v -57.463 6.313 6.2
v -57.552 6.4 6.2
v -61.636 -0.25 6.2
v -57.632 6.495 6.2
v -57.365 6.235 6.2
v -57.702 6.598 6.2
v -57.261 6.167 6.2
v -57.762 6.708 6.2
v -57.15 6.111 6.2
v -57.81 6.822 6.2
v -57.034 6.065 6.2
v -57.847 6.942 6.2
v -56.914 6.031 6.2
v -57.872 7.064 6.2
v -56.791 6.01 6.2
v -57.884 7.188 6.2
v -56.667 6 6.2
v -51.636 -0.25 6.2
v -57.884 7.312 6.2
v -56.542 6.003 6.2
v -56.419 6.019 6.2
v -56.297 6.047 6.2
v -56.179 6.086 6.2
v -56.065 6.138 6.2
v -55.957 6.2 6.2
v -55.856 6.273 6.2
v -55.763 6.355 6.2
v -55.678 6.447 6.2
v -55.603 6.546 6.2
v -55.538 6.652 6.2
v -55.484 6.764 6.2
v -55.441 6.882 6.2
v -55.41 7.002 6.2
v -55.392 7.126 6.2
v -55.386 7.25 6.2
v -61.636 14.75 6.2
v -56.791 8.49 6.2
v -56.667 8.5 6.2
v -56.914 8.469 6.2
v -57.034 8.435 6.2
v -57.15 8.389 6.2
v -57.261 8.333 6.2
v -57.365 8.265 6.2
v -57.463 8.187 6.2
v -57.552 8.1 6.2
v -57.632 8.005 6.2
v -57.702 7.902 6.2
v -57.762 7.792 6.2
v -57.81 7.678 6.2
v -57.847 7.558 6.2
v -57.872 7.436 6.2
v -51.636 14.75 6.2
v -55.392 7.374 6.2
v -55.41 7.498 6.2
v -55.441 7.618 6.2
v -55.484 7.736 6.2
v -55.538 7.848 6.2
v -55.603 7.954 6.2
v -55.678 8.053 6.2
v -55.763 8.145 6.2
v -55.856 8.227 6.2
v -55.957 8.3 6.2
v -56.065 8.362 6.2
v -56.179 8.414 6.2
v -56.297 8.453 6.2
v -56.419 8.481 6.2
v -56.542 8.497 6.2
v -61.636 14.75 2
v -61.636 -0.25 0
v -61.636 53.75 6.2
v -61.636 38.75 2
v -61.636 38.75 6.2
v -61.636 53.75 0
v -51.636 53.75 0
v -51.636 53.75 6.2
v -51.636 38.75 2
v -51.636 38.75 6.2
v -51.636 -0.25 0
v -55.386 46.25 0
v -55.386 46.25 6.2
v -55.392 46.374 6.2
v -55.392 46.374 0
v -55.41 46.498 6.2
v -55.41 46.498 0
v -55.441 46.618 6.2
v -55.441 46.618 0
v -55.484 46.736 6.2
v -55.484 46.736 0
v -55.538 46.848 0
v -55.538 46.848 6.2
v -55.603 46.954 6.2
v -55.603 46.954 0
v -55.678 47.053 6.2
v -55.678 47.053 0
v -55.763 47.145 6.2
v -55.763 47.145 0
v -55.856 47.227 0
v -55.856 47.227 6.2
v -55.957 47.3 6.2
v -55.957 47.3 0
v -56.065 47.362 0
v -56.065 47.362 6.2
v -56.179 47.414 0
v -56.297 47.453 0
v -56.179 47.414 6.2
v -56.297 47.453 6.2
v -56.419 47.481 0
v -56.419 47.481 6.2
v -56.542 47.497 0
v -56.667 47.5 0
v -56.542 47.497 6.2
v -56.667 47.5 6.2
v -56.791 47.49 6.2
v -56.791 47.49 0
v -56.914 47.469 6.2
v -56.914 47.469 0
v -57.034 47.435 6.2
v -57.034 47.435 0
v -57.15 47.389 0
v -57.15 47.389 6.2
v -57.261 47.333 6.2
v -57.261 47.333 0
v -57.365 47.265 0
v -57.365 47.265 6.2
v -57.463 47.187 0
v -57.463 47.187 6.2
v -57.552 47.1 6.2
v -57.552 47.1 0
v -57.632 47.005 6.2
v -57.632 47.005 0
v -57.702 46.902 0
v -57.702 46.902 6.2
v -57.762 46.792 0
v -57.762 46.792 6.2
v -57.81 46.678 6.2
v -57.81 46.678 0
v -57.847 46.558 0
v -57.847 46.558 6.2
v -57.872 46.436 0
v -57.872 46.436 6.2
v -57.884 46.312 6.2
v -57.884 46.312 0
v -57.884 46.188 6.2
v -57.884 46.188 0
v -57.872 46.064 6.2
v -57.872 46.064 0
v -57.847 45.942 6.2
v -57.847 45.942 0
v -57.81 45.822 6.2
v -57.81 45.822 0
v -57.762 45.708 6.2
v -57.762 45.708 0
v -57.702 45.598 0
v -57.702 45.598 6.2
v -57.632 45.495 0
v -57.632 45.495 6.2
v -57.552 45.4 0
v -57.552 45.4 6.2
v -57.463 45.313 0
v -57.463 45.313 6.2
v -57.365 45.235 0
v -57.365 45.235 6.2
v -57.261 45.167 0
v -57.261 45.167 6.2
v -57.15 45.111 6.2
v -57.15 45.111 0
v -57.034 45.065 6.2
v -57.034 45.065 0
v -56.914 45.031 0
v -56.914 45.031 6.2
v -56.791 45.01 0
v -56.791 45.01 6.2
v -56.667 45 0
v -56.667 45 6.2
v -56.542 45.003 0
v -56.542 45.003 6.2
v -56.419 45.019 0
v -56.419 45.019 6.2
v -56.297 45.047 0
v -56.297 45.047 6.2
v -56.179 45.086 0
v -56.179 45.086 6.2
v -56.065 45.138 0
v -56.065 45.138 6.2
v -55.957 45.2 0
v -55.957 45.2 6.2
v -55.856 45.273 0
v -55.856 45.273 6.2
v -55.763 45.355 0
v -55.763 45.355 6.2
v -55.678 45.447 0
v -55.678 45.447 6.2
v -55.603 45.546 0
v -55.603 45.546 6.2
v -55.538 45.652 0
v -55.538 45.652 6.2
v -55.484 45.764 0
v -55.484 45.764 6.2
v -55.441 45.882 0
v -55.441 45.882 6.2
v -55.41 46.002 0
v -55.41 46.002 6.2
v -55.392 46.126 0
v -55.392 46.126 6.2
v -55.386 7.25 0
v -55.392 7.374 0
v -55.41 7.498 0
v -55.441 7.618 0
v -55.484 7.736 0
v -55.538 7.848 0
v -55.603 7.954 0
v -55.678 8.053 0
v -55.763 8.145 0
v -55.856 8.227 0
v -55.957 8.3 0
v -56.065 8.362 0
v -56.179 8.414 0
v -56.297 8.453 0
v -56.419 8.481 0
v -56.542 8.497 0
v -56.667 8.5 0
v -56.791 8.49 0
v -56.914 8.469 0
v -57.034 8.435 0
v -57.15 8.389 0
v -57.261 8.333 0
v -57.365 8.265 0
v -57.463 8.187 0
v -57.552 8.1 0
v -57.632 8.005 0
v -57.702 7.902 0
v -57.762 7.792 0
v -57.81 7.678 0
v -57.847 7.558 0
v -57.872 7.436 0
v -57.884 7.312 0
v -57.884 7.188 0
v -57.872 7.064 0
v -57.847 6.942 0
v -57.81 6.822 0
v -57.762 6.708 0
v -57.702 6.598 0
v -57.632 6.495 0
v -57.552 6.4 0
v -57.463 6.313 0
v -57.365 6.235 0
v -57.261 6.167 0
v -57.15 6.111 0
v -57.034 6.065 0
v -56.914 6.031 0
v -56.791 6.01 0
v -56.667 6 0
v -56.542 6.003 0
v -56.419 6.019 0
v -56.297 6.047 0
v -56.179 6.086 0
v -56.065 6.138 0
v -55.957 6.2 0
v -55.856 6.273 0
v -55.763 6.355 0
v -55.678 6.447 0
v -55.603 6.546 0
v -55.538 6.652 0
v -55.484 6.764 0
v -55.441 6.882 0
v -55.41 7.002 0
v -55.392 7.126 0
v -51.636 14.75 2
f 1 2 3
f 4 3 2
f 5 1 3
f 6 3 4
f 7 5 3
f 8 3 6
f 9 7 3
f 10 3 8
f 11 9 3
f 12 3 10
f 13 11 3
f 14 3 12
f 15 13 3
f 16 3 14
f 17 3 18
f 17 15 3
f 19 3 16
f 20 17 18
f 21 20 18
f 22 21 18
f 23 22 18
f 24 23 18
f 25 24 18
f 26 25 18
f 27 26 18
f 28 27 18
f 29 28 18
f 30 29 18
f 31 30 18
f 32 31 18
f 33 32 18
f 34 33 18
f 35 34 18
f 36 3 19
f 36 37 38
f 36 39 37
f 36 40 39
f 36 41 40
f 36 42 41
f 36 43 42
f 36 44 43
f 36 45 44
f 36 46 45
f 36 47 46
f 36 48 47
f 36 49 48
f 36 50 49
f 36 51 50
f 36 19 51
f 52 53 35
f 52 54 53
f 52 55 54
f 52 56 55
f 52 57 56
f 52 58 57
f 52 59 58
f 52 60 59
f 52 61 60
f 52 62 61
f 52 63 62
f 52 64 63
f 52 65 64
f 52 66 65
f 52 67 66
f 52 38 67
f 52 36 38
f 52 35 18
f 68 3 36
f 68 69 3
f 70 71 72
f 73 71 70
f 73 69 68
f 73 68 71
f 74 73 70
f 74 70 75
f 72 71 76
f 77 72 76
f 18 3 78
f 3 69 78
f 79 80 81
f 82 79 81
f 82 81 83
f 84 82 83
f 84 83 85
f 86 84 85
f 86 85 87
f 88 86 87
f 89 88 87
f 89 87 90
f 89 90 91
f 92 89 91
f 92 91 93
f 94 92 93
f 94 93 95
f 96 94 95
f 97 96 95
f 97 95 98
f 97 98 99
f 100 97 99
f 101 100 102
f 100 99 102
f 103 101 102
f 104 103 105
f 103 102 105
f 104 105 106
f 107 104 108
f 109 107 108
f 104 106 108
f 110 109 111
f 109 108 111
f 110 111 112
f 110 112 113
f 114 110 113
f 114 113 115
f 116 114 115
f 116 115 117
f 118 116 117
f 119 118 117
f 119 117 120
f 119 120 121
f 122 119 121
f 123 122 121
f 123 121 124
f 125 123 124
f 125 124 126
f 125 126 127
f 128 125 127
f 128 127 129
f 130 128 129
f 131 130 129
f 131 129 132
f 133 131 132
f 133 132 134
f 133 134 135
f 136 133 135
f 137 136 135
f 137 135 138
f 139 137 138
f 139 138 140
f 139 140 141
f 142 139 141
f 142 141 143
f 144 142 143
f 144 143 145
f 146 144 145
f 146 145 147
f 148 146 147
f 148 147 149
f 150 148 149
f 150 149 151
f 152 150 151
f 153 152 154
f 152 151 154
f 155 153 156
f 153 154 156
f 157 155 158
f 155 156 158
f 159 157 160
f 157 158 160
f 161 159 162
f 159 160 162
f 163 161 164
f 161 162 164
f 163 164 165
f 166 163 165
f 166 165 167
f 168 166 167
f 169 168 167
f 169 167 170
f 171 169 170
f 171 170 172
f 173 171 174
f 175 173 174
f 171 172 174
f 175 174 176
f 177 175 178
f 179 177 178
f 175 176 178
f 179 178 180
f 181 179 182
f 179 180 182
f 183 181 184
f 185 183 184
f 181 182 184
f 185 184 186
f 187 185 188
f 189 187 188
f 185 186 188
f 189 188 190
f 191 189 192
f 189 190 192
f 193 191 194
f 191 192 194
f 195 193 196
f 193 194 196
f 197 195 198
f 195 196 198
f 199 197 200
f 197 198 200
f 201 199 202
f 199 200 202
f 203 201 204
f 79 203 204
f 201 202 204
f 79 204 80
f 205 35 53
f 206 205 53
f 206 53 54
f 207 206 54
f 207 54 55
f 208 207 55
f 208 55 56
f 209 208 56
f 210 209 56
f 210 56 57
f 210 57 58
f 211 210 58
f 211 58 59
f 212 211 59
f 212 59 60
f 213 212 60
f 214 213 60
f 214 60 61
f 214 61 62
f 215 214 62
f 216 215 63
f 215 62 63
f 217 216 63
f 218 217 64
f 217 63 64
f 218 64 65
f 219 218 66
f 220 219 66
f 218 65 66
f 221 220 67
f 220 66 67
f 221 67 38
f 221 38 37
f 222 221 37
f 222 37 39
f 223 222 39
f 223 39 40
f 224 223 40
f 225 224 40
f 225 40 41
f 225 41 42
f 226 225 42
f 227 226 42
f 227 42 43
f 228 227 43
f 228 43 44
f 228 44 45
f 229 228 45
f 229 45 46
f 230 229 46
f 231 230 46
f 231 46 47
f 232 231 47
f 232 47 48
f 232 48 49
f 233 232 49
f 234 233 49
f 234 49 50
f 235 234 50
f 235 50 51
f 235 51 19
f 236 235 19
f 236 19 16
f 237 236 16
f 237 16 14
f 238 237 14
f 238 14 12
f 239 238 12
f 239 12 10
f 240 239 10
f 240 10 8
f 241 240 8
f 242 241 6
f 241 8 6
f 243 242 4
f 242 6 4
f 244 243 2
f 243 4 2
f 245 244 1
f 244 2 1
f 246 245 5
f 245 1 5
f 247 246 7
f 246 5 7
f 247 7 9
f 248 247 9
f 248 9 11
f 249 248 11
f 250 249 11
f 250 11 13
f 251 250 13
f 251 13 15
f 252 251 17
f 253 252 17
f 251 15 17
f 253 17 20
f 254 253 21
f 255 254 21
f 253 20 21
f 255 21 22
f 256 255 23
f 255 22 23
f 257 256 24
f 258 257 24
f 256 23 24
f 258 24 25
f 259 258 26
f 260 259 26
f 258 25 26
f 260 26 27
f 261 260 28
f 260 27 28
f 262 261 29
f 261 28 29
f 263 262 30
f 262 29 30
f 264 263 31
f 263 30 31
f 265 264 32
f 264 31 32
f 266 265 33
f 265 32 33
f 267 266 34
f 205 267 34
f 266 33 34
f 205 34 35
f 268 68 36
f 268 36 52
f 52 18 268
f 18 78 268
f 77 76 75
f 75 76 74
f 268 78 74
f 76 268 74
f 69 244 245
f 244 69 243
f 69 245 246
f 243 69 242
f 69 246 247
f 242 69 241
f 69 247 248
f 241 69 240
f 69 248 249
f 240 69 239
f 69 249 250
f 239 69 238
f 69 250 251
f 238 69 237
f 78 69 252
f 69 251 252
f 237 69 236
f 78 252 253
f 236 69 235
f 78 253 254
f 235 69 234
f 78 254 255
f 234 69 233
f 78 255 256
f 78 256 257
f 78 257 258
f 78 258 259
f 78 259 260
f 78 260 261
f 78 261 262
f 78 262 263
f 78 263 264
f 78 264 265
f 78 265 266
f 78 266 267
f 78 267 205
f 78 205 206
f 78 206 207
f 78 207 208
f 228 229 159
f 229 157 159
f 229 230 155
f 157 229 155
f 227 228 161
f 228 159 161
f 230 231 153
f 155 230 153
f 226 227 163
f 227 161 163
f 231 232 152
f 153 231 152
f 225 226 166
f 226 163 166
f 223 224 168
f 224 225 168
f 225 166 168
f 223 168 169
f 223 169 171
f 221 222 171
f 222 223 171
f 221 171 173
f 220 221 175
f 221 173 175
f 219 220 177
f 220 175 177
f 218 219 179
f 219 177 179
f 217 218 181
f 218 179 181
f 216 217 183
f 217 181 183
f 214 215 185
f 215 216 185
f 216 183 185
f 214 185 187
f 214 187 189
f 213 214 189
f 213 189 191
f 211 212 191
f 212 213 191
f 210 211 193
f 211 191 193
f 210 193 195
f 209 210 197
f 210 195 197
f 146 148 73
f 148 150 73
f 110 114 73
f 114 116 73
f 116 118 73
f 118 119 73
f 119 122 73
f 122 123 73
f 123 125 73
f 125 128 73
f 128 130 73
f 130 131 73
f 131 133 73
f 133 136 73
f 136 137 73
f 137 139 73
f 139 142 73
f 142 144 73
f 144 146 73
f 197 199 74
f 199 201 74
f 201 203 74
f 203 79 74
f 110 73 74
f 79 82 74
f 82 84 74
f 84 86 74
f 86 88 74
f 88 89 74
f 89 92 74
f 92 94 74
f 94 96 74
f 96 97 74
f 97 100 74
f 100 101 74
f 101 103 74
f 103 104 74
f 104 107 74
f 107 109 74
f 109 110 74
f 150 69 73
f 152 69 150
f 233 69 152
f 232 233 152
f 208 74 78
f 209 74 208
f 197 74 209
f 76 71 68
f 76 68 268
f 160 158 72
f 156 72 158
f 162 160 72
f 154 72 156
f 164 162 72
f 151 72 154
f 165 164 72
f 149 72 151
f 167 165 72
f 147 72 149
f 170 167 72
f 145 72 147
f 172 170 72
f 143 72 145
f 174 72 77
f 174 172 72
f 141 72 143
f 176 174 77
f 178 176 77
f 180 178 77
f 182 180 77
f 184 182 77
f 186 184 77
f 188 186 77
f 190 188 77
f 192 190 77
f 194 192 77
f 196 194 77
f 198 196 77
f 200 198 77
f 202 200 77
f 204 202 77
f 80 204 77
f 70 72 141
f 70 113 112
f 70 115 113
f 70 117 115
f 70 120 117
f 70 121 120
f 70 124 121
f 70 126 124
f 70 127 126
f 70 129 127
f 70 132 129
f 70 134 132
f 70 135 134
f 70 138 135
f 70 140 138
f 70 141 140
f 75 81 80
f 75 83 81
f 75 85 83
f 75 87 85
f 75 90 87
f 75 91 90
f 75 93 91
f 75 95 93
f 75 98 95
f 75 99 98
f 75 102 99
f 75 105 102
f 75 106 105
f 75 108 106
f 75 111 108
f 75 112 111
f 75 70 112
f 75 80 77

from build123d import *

# Parameters (mm, degrees)
SKETCH_1_W          = 10
SKETCH_1_H          = 54
EXTRUDE_1_DEPTH     = 2
SKETCH_2_W          = 10
SKETCH_2_H          = 15
EXTRUDE_2_DEPTH     = 4.2
SKETCH_3_R          = 1.25
CUT_EXTRUDE_1_DEPTH = 83.01490969


with BuildPart() as part:
    # 草圖1 → 填料-伸長1 (new body)
    with BuildSketch(Plane.XY):
        with Locations((-56.635565313, 26.75)):
            Rectangle(SKETCH_1_W, SKETCH_1_H)
    extrude(amount=EXTRUDE_1_DEPTH)

    # 草圖2 → 填料-伸長2 (add)
    with BuildSketch(Plane.XY.offset(2)):
        with Locations((-56.635565313, 7.25)):
            Rectangle(SKETCH_2_W, SKETCH_2_H)
        with Locations((-56.635565313, 46.25)):
            Rectangle(SKETCH_2_W, SKETCH_2_H)
    extrude(amount=EXTRUDE_2_DEPTH)

    # 草圖3 → 除料-伸長1 (cut, through all)
    with BuildSketch(Plane.XY.offset(6.2)):
        with Locations((-56.635565313, 7.25)):
            Circle(SKETCH_3_R)
        with Locations((-56.635565313, 46.25)):
            Circle(SKETCH_3_R)
    extrude(amount=-CUT_EXTRUDE_1_DEPTH, mode=Mode.SUBTRACT)


solid = part.part
